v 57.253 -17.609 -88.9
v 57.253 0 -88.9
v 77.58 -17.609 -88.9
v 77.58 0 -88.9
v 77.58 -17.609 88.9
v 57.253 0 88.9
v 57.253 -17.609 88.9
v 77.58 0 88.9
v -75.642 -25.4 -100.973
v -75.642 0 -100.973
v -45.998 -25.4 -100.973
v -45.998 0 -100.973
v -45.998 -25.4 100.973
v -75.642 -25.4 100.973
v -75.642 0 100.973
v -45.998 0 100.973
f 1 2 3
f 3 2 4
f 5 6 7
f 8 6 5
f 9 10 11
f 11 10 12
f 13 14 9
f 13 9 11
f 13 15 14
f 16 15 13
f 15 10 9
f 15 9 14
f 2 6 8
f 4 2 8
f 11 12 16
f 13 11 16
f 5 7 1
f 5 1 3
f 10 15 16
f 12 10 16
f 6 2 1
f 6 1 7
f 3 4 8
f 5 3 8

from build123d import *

# Parameters (mm, degrees)
F0_W     = 20.326555
F0_H     = 177.8
F1_DEPTH = 17.608827
F3_W     = 29.643357
F3_H     = 201.945334
F4_DEPTH = 25.4


with BuildPart() as f1:
    # F0 (on Front) → F1 (new body)
    with BuildSketch(Plane.XZ):
        with Locations((67.416429, 0)):
            Rectangle(F0_W, F0_H)
    extrude(amount=F1_DEPTH)


with BuildPart() as f4:
    # F3 (on face) → F4 (new body)
    with BuildSketch(Plane.XZ):
        with Locations((-60.820117, 0)):
            Rectangle(F3_W, F3_H)
    extrude(amount=F4_DEPTH)


solid = Compound([f1.part, f4.part])
